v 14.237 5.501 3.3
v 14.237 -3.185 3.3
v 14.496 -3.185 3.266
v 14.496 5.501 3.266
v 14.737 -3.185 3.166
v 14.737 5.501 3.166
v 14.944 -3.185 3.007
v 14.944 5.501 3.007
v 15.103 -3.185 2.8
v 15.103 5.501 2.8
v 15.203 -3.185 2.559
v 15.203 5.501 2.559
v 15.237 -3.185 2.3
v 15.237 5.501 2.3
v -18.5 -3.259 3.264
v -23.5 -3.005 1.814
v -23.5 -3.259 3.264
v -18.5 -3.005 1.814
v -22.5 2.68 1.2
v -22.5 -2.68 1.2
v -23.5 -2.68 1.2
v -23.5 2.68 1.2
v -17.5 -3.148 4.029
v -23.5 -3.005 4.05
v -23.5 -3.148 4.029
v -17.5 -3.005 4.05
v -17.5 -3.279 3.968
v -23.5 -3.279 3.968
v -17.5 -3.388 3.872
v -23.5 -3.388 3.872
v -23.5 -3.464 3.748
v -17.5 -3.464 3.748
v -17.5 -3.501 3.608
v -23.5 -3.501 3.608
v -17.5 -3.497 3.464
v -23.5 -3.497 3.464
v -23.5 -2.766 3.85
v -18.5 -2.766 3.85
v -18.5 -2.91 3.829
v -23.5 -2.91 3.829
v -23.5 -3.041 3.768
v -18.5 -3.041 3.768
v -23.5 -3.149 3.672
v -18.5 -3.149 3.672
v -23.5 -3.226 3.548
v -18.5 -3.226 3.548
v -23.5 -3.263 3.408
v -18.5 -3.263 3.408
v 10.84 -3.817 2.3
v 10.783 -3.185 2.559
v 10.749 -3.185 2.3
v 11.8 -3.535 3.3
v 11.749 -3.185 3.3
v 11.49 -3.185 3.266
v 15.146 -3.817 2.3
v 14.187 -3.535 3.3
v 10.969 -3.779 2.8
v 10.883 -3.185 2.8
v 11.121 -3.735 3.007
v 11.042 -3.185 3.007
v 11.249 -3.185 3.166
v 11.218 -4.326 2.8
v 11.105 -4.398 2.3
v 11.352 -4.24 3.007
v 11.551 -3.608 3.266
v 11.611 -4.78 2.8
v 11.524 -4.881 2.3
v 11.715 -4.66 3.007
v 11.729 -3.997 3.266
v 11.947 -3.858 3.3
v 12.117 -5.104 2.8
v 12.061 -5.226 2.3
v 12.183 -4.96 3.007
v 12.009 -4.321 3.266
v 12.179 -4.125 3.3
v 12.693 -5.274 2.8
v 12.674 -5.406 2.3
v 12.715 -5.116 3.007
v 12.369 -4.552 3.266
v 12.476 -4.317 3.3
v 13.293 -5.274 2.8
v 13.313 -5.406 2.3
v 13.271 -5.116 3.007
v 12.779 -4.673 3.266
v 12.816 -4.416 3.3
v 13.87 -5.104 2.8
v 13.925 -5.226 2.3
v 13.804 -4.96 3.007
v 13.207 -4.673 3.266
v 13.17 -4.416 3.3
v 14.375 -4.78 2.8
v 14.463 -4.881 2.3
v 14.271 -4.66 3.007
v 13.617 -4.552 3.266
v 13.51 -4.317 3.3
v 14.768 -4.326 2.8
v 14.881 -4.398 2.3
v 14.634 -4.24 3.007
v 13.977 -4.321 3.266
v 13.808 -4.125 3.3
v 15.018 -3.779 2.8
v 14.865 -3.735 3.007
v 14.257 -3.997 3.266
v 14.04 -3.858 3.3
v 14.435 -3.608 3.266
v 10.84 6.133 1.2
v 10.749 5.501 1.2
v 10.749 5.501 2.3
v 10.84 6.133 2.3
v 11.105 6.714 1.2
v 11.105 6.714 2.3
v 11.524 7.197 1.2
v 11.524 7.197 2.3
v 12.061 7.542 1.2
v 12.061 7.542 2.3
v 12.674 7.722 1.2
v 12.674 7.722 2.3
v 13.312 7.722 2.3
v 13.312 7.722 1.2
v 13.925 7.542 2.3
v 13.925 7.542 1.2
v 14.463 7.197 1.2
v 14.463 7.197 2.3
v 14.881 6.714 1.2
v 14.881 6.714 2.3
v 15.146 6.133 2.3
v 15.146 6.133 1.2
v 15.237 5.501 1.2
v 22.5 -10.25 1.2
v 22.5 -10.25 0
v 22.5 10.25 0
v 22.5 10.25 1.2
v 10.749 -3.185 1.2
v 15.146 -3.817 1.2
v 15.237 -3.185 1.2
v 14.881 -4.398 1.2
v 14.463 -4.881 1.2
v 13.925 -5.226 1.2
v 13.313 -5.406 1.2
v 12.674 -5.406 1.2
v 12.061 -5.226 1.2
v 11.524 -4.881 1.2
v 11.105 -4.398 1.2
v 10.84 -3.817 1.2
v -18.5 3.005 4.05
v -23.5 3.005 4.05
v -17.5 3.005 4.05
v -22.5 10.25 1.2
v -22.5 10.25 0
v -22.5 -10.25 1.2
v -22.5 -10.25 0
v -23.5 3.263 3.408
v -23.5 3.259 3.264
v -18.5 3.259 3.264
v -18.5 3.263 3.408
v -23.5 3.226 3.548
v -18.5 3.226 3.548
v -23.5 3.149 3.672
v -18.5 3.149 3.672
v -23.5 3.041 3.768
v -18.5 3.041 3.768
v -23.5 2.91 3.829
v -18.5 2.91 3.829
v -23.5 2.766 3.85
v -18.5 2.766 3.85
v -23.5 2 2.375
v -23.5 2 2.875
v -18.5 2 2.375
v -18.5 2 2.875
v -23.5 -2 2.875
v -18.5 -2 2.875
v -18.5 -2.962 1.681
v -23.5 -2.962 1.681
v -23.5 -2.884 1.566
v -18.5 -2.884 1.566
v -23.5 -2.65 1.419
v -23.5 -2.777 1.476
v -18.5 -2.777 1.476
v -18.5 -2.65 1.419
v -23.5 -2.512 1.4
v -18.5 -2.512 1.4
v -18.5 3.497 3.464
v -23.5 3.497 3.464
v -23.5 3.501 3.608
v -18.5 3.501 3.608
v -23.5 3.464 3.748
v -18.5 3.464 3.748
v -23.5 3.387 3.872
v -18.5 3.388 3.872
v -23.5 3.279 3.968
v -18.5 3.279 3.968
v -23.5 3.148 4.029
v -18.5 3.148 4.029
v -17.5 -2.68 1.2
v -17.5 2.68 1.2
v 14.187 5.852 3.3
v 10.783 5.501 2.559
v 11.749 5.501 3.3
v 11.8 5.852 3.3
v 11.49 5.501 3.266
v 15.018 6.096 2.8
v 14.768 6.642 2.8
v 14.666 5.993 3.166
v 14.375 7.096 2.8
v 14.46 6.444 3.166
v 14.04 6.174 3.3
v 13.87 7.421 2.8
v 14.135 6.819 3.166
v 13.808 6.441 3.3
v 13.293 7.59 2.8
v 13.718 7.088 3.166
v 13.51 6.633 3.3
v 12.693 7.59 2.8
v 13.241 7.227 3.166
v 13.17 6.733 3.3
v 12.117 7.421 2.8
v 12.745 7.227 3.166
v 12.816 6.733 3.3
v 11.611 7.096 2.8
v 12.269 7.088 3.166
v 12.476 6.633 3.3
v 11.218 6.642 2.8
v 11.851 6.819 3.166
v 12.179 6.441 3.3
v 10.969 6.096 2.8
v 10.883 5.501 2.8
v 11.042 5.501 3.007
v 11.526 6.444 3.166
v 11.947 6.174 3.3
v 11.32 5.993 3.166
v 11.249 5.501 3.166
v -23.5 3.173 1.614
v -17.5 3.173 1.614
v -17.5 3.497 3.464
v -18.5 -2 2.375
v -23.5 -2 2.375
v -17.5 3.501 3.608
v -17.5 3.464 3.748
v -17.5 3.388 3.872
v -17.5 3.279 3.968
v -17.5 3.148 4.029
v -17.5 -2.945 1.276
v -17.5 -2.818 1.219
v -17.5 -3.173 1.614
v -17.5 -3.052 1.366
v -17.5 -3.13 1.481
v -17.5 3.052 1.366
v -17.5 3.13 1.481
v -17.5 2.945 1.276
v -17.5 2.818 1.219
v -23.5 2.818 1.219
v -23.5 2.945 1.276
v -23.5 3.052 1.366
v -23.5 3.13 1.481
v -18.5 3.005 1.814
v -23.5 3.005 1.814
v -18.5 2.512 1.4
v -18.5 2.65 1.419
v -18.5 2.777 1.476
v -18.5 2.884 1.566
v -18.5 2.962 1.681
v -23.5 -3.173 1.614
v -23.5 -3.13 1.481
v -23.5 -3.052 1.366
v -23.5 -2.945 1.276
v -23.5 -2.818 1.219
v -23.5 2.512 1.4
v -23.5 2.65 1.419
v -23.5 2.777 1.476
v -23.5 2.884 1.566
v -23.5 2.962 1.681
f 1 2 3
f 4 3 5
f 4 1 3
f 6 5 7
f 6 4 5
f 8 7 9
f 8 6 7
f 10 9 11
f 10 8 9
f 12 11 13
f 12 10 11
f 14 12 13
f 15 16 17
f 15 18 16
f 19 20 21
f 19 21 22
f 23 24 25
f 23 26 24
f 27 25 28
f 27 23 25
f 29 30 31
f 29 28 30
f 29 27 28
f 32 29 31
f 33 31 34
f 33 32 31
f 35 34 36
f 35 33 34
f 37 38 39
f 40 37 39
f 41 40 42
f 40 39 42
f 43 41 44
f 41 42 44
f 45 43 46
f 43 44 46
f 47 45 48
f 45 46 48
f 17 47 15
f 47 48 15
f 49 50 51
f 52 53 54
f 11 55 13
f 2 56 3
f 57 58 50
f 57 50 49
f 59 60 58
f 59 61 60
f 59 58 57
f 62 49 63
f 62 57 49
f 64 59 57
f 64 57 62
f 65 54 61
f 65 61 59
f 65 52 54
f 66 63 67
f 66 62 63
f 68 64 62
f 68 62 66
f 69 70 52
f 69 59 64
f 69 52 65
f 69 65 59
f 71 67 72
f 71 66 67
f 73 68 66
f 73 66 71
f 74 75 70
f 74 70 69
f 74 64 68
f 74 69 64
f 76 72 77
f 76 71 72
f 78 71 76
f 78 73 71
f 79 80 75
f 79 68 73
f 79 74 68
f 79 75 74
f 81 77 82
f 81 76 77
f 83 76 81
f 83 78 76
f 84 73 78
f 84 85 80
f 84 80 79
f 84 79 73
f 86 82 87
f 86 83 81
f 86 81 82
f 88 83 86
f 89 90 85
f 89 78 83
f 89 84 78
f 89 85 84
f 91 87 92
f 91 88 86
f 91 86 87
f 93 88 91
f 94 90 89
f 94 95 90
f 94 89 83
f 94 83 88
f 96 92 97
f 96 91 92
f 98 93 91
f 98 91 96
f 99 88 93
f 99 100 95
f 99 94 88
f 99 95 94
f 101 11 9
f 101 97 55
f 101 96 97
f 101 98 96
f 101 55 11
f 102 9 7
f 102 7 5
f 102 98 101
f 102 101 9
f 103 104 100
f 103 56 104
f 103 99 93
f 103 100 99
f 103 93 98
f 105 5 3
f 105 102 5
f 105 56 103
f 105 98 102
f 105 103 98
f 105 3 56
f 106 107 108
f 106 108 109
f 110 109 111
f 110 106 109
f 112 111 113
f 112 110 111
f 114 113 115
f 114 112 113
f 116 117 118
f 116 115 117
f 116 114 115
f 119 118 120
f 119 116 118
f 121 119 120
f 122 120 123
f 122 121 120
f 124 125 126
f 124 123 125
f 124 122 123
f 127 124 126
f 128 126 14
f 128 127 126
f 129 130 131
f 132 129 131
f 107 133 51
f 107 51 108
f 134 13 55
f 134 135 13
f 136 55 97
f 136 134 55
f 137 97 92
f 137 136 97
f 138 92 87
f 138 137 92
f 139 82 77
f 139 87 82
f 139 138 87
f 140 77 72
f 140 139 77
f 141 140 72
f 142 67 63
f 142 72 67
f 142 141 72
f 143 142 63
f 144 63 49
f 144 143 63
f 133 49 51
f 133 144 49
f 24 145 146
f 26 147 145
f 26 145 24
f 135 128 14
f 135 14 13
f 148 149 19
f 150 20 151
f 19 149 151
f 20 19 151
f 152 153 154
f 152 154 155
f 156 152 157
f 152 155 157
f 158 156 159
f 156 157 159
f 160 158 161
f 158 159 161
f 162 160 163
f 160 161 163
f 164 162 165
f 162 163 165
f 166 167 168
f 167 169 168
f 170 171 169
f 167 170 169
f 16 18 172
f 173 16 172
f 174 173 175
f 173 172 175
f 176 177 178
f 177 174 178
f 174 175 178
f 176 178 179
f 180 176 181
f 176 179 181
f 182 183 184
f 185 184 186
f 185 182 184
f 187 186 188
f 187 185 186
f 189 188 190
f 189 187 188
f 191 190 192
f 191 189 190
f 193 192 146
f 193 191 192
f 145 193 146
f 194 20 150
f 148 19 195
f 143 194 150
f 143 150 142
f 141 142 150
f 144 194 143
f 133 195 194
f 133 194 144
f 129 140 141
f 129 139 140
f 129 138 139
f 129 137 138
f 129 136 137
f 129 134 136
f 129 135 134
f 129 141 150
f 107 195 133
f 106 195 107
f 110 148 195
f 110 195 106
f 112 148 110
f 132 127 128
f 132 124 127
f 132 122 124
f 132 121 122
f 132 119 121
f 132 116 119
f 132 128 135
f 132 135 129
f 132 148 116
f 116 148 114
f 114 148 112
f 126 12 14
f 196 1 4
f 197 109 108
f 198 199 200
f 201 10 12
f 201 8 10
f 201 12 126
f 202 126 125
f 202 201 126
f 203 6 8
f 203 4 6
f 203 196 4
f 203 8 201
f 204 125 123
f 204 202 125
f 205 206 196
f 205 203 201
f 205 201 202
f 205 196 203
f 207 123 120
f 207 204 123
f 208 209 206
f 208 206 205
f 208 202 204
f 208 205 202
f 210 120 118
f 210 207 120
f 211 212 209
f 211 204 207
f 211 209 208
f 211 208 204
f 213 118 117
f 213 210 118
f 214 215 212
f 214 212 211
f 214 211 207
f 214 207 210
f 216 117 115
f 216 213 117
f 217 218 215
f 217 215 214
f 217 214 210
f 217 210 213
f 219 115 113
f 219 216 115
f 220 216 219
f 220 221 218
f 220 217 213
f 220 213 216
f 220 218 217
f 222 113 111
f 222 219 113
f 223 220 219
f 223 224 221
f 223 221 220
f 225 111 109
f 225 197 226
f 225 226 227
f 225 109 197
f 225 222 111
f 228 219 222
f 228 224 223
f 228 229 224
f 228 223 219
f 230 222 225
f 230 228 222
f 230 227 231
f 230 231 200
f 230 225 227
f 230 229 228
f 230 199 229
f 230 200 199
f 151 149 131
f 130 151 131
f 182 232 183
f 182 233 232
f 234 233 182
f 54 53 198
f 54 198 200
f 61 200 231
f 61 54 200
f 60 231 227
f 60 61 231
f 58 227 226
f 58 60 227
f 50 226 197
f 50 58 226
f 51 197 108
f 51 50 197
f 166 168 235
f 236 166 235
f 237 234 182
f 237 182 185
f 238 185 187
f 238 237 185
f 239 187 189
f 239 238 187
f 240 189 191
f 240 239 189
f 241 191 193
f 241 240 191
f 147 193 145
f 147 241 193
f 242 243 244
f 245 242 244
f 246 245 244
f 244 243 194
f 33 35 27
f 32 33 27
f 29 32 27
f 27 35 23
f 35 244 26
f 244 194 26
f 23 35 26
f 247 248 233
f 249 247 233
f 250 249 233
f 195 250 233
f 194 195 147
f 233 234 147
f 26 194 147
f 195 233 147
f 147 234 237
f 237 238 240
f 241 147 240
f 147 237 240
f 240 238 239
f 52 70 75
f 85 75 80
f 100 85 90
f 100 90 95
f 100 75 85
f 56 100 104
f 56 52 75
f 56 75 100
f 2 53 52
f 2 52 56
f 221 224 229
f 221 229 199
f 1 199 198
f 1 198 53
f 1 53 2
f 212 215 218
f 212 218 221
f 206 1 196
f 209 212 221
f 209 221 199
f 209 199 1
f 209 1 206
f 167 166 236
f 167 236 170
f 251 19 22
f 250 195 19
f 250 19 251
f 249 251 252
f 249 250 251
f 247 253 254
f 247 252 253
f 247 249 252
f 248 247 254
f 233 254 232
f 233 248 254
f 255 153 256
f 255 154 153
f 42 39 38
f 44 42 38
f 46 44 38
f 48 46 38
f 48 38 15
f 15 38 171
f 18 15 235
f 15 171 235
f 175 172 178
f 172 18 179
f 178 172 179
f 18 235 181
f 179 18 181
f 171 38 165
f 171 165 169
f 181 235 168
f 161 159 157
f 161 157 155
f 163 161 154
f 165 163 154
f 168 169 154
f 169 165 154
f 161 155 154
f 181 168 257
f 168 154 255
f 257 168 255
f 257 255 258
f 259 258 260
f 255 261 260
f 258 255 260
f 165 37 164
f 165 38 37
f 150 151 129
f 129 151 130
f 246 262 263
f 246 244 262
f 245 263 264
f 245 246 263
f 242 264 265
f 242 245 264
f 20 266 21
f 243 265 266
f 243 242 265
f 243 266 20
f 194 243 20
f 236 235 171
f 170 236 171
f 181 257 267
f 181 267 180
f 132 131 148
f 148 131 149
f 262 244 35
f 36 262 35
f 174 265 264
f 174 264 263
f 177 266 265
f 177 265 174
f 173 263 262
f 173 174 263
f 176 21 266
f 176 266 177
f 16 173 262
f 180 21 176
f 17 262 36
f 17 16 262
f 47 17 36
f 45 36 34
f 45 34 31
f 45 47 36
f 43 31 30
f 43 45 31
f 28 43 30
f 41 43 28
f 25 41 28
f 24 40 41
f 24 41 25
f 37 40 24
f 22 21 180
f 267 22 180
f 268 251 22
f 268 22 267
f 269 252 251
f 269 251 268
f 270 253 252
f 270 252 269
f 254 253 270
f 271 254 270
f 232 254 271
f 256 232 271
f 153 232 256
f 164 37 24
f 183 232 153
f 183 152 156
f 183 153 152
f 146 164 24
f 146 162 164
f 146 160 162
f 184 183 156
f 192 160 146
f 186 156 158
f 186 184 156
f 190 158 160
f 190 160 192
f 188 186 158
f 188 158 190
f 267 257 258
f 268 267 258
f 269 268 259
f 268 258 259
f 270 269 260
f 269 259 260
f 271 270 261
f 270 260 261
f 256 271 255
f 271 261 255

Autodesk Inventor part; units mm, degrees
ref_plane "YZ Plane" through (0, 0, 0) normal (1, 0, 0) x (0, 1, 0)
ref_plane "XZ Plane" through (0, 0, 0) normal (0, 1, 0) x (-1, 0, 0)
ref_plane "XY Plane" through (0, 0, 0) normal (0, 0, 1) x (1, 0, 0)
sketch "스케치1" plane through (0, 0, 0) normal (0, 0, 1) x (1, 0, 0)
  line L0 (-22.5, -10.25) -> (22.5, -10.25)
  line L1 (22.5, -10.25) -> (22.5, 10.25)
  line L2 (22.5, 10.25) -> (-22.5, 10.25)
  line L3 (-22.5, 10.25) -> (-22.5, -10.25)
  line L4 (-22.5, -10.25) -> (22.5, 10.25) construction
  line L5 (22.5, -10.25) -> (-22.5, 10.25) construction
  point P0 (0, 0)
  dimension "d0" = 45
  dimension "d1" = 20.5
extrude "돌출1" add sketch "스케치1" along normal blind 1.2
sketch "스케치2" plane through (-22.5, -10.25, 0) normal (-1, 0, 0) x (0, 0, 1)
  line L0 (1.2, 0) -> (1.2, 20.5) projected
  line L1 (4.05, 6.65) -> (1.2, 6.65) construction
  line L2 (1.2, 6.65) -> (1.2, 13.85)
  line L3 (1.2, 13.85) -> (4.05, 13.85) construction
  line L4 (4.05, 13.2546) -> (4.05, 7.2454)
  line L5 (4.05, 6.65) -> (1.2, 13.85) construction
  line L6 (1.2, 6.65) -> (4.05, 13.85) construction
  line L7 (1.6136, 13.4226) -> (3.4636, 13.7471)
  line L8 (1.6136, 7.0774) -> (3.4636, 6.7529)
  line L9 (1.2, 12.9301) -> (1.2, 7.5699)
  line L10 (3.85, 7.4835) -> (3.85, 13.0165)
  line L11 (3.2636, 13.509) -> (1.8136, 13.2546)
  line L12 (1.4, 12.7621) -> (1.4, 7.7379)
  line L13 (1.8136, 7.2454) -> (3.2636, 6.991)
  line L14 (2.375, 8.25) -> (2.875, 8.25)
  line L15 (2.875, 8.25) -> (2.875, 12.25)
  line L16 (2.875, 12.25) -> (2.375, 12.25)
  line L17 (2.375, 12.25) -> (2.375, 8.25)
  line L18 (2.375, 8.25) -> (2.875, 12.25) construction
  line L19 (2.875, 8.25) -> (2.375, 12.25) construction
  arc A0 (1.6136, 13.4226) -> (1.2, 12.9301) centre (1.7, 12.9301) ccw
  arc A1 (4.05, 13.2546) -> (3.4636, 13.7471) centre (3.55, 13.2546) ccw
  arc A2 (3.4636, 6.7529) -> (4.05, 7.2454) centre (3.55, 7.2454) ccw
  arc A3 (1.2, 7.5699) -> (1.6136, 7.0774) centre (1.7, 7.5699) ccw
  arc A4 (1.4, 7.7379) -> (1.8136, 7.2454) centre (1.9, 7.7379) ccw
  arc A5 (3.2636, 6.991) -> (3.85, 7.4835) centre (3.35, 7.4835) ccw
  arc A6 (3.85, 13.0165) -> (3.2636, 13.509) centre (3.35, 13.0165) ccw
  arc A7 (1.8136, 13.2546) -> (1.4, 12.7621) centre (1.9, 12.7621) ccw
  point P0 (0, 10.25)
  point P1 (2.625, 10.25)
  point P2 (1.2, 10.25)
  point P3 (1.2, 13.35)
  point P4 (1.2, 7.15)
  dimension "d4" = 2.85
  dimension "d5" = 7.2
  dimension "d6" = 0.5
  dimension "d7" = 0.5
  dimension "d8" = 0.2
  dimension "d9" = 0.5
  dimension "d10" = 4
  dimension "d11" = 0.5
extrude "돌출2" add sketch "스케치2" along normal blind 1 and the other way blind 5
sketch "스케치3" plane through (-17.5, -10.25, 0) normal (1, 0, 0) x (0, 0, -1)
  arc A0 (-4.05, 7.2454) -> (-3.4636, 6.7529) centre (-3.55, 7.2454) ccw projected
  line L0 (-3.4636, 6.7529) -> (-1.6136, 7.0774) projected
  arc A1 (-1.6136, 7.0774) -> (-1.2, 7.5699) centre (-1.7, 7.5699) ccw projected
  line L1 (-1.2, 12.9301) -> (-1.2, 7.5699) projected
  arc A2 (-1.2, 12.9301) -> (-1.6136, 13.4226) centre (-1.7, 12.9301) ccw projected
  line L2 (-1.6136, 13.4226) -> (-3.4636, 13.7471) projected
  arc A3 (-3.4636, 13.7471) -> (-4.05, 13.2546) centre (-3.55, 13.2546) ccw projected
  line L3 (-4.05, 13.2546) -> (-4.05, 7.2454) projected
  arc A4 (-3.85, 7.4835) -> (-3.2636, 6.991) centre (-3.35, 7.4835) ccw projected
  line L4 (-3.85, 7.4835) -> (-3.85, 13.0165) projected
  arc A5 (-3.2636, 13.509) -> (-3.85, 13.0165) centre (-3.35, 13.0165) ccw projected
  line L5 (-3.2636, 13.509) -> (-1.8136, 13.2546) projected
  arc A6 (-1.4, 12.7621) -> (-1.8136, 13.2546) centre (-1.9, 12.7621) ccw projected
  line L6 (-1.4, 12.7621) -> (-1.4, 7.7379) projected
  arc A7 (-1.8136, 7.2454) -> (-1.4, 7.7379) centre (-1.9, 7.7379) ccw projected
  line L7 (-1.8136, 7.2454) -> (-3.2636, 6.991) projected
  point P0 (0, 10.25)
extrude "돌출3" add sketch "스케치3" against normal blind 1 contours L3 A3 L2 A2 L1 A1 L0 A0 | L4 A5 L5 A6 L6 A7 L7 A4
sketch "스케치4" plane through (0, 0, 1.2) normal (0, 0, 1) x (1, 0, 0)
  line L0 (12.9932, 5.5013) -> (12.9932, -3.185) construction
  line L1 (15.2371, 5.5013) -> (15.2371, -3.185)
  line L2 (10.7492, -3.185) -> (10.7492, 5.5013)
  arc A0 (15.2371, 5.5013) -> (10.7492, 5.5013) centre (12.9932, 5.5013) ccw
  arc A1 (10.7492, -3.185) -> (15.2371, -3.185) centre (12.9932, -3.185) ccw
  point P0 (0, 0)
  point P1 (12.9932, 1.1582)
extrude "돌출4" add sketch "스케치4" along normal blind 2.1
fillet "모깎기1" radius 1 4 edges at (12.9932, 7.7452, 3.3) (10.7492, 1.1582, 3.3) (12.9932, -5.4289, 3.3) (15.2371, 1.1582, 3.3)
properties part number "블루투스 모듈"
